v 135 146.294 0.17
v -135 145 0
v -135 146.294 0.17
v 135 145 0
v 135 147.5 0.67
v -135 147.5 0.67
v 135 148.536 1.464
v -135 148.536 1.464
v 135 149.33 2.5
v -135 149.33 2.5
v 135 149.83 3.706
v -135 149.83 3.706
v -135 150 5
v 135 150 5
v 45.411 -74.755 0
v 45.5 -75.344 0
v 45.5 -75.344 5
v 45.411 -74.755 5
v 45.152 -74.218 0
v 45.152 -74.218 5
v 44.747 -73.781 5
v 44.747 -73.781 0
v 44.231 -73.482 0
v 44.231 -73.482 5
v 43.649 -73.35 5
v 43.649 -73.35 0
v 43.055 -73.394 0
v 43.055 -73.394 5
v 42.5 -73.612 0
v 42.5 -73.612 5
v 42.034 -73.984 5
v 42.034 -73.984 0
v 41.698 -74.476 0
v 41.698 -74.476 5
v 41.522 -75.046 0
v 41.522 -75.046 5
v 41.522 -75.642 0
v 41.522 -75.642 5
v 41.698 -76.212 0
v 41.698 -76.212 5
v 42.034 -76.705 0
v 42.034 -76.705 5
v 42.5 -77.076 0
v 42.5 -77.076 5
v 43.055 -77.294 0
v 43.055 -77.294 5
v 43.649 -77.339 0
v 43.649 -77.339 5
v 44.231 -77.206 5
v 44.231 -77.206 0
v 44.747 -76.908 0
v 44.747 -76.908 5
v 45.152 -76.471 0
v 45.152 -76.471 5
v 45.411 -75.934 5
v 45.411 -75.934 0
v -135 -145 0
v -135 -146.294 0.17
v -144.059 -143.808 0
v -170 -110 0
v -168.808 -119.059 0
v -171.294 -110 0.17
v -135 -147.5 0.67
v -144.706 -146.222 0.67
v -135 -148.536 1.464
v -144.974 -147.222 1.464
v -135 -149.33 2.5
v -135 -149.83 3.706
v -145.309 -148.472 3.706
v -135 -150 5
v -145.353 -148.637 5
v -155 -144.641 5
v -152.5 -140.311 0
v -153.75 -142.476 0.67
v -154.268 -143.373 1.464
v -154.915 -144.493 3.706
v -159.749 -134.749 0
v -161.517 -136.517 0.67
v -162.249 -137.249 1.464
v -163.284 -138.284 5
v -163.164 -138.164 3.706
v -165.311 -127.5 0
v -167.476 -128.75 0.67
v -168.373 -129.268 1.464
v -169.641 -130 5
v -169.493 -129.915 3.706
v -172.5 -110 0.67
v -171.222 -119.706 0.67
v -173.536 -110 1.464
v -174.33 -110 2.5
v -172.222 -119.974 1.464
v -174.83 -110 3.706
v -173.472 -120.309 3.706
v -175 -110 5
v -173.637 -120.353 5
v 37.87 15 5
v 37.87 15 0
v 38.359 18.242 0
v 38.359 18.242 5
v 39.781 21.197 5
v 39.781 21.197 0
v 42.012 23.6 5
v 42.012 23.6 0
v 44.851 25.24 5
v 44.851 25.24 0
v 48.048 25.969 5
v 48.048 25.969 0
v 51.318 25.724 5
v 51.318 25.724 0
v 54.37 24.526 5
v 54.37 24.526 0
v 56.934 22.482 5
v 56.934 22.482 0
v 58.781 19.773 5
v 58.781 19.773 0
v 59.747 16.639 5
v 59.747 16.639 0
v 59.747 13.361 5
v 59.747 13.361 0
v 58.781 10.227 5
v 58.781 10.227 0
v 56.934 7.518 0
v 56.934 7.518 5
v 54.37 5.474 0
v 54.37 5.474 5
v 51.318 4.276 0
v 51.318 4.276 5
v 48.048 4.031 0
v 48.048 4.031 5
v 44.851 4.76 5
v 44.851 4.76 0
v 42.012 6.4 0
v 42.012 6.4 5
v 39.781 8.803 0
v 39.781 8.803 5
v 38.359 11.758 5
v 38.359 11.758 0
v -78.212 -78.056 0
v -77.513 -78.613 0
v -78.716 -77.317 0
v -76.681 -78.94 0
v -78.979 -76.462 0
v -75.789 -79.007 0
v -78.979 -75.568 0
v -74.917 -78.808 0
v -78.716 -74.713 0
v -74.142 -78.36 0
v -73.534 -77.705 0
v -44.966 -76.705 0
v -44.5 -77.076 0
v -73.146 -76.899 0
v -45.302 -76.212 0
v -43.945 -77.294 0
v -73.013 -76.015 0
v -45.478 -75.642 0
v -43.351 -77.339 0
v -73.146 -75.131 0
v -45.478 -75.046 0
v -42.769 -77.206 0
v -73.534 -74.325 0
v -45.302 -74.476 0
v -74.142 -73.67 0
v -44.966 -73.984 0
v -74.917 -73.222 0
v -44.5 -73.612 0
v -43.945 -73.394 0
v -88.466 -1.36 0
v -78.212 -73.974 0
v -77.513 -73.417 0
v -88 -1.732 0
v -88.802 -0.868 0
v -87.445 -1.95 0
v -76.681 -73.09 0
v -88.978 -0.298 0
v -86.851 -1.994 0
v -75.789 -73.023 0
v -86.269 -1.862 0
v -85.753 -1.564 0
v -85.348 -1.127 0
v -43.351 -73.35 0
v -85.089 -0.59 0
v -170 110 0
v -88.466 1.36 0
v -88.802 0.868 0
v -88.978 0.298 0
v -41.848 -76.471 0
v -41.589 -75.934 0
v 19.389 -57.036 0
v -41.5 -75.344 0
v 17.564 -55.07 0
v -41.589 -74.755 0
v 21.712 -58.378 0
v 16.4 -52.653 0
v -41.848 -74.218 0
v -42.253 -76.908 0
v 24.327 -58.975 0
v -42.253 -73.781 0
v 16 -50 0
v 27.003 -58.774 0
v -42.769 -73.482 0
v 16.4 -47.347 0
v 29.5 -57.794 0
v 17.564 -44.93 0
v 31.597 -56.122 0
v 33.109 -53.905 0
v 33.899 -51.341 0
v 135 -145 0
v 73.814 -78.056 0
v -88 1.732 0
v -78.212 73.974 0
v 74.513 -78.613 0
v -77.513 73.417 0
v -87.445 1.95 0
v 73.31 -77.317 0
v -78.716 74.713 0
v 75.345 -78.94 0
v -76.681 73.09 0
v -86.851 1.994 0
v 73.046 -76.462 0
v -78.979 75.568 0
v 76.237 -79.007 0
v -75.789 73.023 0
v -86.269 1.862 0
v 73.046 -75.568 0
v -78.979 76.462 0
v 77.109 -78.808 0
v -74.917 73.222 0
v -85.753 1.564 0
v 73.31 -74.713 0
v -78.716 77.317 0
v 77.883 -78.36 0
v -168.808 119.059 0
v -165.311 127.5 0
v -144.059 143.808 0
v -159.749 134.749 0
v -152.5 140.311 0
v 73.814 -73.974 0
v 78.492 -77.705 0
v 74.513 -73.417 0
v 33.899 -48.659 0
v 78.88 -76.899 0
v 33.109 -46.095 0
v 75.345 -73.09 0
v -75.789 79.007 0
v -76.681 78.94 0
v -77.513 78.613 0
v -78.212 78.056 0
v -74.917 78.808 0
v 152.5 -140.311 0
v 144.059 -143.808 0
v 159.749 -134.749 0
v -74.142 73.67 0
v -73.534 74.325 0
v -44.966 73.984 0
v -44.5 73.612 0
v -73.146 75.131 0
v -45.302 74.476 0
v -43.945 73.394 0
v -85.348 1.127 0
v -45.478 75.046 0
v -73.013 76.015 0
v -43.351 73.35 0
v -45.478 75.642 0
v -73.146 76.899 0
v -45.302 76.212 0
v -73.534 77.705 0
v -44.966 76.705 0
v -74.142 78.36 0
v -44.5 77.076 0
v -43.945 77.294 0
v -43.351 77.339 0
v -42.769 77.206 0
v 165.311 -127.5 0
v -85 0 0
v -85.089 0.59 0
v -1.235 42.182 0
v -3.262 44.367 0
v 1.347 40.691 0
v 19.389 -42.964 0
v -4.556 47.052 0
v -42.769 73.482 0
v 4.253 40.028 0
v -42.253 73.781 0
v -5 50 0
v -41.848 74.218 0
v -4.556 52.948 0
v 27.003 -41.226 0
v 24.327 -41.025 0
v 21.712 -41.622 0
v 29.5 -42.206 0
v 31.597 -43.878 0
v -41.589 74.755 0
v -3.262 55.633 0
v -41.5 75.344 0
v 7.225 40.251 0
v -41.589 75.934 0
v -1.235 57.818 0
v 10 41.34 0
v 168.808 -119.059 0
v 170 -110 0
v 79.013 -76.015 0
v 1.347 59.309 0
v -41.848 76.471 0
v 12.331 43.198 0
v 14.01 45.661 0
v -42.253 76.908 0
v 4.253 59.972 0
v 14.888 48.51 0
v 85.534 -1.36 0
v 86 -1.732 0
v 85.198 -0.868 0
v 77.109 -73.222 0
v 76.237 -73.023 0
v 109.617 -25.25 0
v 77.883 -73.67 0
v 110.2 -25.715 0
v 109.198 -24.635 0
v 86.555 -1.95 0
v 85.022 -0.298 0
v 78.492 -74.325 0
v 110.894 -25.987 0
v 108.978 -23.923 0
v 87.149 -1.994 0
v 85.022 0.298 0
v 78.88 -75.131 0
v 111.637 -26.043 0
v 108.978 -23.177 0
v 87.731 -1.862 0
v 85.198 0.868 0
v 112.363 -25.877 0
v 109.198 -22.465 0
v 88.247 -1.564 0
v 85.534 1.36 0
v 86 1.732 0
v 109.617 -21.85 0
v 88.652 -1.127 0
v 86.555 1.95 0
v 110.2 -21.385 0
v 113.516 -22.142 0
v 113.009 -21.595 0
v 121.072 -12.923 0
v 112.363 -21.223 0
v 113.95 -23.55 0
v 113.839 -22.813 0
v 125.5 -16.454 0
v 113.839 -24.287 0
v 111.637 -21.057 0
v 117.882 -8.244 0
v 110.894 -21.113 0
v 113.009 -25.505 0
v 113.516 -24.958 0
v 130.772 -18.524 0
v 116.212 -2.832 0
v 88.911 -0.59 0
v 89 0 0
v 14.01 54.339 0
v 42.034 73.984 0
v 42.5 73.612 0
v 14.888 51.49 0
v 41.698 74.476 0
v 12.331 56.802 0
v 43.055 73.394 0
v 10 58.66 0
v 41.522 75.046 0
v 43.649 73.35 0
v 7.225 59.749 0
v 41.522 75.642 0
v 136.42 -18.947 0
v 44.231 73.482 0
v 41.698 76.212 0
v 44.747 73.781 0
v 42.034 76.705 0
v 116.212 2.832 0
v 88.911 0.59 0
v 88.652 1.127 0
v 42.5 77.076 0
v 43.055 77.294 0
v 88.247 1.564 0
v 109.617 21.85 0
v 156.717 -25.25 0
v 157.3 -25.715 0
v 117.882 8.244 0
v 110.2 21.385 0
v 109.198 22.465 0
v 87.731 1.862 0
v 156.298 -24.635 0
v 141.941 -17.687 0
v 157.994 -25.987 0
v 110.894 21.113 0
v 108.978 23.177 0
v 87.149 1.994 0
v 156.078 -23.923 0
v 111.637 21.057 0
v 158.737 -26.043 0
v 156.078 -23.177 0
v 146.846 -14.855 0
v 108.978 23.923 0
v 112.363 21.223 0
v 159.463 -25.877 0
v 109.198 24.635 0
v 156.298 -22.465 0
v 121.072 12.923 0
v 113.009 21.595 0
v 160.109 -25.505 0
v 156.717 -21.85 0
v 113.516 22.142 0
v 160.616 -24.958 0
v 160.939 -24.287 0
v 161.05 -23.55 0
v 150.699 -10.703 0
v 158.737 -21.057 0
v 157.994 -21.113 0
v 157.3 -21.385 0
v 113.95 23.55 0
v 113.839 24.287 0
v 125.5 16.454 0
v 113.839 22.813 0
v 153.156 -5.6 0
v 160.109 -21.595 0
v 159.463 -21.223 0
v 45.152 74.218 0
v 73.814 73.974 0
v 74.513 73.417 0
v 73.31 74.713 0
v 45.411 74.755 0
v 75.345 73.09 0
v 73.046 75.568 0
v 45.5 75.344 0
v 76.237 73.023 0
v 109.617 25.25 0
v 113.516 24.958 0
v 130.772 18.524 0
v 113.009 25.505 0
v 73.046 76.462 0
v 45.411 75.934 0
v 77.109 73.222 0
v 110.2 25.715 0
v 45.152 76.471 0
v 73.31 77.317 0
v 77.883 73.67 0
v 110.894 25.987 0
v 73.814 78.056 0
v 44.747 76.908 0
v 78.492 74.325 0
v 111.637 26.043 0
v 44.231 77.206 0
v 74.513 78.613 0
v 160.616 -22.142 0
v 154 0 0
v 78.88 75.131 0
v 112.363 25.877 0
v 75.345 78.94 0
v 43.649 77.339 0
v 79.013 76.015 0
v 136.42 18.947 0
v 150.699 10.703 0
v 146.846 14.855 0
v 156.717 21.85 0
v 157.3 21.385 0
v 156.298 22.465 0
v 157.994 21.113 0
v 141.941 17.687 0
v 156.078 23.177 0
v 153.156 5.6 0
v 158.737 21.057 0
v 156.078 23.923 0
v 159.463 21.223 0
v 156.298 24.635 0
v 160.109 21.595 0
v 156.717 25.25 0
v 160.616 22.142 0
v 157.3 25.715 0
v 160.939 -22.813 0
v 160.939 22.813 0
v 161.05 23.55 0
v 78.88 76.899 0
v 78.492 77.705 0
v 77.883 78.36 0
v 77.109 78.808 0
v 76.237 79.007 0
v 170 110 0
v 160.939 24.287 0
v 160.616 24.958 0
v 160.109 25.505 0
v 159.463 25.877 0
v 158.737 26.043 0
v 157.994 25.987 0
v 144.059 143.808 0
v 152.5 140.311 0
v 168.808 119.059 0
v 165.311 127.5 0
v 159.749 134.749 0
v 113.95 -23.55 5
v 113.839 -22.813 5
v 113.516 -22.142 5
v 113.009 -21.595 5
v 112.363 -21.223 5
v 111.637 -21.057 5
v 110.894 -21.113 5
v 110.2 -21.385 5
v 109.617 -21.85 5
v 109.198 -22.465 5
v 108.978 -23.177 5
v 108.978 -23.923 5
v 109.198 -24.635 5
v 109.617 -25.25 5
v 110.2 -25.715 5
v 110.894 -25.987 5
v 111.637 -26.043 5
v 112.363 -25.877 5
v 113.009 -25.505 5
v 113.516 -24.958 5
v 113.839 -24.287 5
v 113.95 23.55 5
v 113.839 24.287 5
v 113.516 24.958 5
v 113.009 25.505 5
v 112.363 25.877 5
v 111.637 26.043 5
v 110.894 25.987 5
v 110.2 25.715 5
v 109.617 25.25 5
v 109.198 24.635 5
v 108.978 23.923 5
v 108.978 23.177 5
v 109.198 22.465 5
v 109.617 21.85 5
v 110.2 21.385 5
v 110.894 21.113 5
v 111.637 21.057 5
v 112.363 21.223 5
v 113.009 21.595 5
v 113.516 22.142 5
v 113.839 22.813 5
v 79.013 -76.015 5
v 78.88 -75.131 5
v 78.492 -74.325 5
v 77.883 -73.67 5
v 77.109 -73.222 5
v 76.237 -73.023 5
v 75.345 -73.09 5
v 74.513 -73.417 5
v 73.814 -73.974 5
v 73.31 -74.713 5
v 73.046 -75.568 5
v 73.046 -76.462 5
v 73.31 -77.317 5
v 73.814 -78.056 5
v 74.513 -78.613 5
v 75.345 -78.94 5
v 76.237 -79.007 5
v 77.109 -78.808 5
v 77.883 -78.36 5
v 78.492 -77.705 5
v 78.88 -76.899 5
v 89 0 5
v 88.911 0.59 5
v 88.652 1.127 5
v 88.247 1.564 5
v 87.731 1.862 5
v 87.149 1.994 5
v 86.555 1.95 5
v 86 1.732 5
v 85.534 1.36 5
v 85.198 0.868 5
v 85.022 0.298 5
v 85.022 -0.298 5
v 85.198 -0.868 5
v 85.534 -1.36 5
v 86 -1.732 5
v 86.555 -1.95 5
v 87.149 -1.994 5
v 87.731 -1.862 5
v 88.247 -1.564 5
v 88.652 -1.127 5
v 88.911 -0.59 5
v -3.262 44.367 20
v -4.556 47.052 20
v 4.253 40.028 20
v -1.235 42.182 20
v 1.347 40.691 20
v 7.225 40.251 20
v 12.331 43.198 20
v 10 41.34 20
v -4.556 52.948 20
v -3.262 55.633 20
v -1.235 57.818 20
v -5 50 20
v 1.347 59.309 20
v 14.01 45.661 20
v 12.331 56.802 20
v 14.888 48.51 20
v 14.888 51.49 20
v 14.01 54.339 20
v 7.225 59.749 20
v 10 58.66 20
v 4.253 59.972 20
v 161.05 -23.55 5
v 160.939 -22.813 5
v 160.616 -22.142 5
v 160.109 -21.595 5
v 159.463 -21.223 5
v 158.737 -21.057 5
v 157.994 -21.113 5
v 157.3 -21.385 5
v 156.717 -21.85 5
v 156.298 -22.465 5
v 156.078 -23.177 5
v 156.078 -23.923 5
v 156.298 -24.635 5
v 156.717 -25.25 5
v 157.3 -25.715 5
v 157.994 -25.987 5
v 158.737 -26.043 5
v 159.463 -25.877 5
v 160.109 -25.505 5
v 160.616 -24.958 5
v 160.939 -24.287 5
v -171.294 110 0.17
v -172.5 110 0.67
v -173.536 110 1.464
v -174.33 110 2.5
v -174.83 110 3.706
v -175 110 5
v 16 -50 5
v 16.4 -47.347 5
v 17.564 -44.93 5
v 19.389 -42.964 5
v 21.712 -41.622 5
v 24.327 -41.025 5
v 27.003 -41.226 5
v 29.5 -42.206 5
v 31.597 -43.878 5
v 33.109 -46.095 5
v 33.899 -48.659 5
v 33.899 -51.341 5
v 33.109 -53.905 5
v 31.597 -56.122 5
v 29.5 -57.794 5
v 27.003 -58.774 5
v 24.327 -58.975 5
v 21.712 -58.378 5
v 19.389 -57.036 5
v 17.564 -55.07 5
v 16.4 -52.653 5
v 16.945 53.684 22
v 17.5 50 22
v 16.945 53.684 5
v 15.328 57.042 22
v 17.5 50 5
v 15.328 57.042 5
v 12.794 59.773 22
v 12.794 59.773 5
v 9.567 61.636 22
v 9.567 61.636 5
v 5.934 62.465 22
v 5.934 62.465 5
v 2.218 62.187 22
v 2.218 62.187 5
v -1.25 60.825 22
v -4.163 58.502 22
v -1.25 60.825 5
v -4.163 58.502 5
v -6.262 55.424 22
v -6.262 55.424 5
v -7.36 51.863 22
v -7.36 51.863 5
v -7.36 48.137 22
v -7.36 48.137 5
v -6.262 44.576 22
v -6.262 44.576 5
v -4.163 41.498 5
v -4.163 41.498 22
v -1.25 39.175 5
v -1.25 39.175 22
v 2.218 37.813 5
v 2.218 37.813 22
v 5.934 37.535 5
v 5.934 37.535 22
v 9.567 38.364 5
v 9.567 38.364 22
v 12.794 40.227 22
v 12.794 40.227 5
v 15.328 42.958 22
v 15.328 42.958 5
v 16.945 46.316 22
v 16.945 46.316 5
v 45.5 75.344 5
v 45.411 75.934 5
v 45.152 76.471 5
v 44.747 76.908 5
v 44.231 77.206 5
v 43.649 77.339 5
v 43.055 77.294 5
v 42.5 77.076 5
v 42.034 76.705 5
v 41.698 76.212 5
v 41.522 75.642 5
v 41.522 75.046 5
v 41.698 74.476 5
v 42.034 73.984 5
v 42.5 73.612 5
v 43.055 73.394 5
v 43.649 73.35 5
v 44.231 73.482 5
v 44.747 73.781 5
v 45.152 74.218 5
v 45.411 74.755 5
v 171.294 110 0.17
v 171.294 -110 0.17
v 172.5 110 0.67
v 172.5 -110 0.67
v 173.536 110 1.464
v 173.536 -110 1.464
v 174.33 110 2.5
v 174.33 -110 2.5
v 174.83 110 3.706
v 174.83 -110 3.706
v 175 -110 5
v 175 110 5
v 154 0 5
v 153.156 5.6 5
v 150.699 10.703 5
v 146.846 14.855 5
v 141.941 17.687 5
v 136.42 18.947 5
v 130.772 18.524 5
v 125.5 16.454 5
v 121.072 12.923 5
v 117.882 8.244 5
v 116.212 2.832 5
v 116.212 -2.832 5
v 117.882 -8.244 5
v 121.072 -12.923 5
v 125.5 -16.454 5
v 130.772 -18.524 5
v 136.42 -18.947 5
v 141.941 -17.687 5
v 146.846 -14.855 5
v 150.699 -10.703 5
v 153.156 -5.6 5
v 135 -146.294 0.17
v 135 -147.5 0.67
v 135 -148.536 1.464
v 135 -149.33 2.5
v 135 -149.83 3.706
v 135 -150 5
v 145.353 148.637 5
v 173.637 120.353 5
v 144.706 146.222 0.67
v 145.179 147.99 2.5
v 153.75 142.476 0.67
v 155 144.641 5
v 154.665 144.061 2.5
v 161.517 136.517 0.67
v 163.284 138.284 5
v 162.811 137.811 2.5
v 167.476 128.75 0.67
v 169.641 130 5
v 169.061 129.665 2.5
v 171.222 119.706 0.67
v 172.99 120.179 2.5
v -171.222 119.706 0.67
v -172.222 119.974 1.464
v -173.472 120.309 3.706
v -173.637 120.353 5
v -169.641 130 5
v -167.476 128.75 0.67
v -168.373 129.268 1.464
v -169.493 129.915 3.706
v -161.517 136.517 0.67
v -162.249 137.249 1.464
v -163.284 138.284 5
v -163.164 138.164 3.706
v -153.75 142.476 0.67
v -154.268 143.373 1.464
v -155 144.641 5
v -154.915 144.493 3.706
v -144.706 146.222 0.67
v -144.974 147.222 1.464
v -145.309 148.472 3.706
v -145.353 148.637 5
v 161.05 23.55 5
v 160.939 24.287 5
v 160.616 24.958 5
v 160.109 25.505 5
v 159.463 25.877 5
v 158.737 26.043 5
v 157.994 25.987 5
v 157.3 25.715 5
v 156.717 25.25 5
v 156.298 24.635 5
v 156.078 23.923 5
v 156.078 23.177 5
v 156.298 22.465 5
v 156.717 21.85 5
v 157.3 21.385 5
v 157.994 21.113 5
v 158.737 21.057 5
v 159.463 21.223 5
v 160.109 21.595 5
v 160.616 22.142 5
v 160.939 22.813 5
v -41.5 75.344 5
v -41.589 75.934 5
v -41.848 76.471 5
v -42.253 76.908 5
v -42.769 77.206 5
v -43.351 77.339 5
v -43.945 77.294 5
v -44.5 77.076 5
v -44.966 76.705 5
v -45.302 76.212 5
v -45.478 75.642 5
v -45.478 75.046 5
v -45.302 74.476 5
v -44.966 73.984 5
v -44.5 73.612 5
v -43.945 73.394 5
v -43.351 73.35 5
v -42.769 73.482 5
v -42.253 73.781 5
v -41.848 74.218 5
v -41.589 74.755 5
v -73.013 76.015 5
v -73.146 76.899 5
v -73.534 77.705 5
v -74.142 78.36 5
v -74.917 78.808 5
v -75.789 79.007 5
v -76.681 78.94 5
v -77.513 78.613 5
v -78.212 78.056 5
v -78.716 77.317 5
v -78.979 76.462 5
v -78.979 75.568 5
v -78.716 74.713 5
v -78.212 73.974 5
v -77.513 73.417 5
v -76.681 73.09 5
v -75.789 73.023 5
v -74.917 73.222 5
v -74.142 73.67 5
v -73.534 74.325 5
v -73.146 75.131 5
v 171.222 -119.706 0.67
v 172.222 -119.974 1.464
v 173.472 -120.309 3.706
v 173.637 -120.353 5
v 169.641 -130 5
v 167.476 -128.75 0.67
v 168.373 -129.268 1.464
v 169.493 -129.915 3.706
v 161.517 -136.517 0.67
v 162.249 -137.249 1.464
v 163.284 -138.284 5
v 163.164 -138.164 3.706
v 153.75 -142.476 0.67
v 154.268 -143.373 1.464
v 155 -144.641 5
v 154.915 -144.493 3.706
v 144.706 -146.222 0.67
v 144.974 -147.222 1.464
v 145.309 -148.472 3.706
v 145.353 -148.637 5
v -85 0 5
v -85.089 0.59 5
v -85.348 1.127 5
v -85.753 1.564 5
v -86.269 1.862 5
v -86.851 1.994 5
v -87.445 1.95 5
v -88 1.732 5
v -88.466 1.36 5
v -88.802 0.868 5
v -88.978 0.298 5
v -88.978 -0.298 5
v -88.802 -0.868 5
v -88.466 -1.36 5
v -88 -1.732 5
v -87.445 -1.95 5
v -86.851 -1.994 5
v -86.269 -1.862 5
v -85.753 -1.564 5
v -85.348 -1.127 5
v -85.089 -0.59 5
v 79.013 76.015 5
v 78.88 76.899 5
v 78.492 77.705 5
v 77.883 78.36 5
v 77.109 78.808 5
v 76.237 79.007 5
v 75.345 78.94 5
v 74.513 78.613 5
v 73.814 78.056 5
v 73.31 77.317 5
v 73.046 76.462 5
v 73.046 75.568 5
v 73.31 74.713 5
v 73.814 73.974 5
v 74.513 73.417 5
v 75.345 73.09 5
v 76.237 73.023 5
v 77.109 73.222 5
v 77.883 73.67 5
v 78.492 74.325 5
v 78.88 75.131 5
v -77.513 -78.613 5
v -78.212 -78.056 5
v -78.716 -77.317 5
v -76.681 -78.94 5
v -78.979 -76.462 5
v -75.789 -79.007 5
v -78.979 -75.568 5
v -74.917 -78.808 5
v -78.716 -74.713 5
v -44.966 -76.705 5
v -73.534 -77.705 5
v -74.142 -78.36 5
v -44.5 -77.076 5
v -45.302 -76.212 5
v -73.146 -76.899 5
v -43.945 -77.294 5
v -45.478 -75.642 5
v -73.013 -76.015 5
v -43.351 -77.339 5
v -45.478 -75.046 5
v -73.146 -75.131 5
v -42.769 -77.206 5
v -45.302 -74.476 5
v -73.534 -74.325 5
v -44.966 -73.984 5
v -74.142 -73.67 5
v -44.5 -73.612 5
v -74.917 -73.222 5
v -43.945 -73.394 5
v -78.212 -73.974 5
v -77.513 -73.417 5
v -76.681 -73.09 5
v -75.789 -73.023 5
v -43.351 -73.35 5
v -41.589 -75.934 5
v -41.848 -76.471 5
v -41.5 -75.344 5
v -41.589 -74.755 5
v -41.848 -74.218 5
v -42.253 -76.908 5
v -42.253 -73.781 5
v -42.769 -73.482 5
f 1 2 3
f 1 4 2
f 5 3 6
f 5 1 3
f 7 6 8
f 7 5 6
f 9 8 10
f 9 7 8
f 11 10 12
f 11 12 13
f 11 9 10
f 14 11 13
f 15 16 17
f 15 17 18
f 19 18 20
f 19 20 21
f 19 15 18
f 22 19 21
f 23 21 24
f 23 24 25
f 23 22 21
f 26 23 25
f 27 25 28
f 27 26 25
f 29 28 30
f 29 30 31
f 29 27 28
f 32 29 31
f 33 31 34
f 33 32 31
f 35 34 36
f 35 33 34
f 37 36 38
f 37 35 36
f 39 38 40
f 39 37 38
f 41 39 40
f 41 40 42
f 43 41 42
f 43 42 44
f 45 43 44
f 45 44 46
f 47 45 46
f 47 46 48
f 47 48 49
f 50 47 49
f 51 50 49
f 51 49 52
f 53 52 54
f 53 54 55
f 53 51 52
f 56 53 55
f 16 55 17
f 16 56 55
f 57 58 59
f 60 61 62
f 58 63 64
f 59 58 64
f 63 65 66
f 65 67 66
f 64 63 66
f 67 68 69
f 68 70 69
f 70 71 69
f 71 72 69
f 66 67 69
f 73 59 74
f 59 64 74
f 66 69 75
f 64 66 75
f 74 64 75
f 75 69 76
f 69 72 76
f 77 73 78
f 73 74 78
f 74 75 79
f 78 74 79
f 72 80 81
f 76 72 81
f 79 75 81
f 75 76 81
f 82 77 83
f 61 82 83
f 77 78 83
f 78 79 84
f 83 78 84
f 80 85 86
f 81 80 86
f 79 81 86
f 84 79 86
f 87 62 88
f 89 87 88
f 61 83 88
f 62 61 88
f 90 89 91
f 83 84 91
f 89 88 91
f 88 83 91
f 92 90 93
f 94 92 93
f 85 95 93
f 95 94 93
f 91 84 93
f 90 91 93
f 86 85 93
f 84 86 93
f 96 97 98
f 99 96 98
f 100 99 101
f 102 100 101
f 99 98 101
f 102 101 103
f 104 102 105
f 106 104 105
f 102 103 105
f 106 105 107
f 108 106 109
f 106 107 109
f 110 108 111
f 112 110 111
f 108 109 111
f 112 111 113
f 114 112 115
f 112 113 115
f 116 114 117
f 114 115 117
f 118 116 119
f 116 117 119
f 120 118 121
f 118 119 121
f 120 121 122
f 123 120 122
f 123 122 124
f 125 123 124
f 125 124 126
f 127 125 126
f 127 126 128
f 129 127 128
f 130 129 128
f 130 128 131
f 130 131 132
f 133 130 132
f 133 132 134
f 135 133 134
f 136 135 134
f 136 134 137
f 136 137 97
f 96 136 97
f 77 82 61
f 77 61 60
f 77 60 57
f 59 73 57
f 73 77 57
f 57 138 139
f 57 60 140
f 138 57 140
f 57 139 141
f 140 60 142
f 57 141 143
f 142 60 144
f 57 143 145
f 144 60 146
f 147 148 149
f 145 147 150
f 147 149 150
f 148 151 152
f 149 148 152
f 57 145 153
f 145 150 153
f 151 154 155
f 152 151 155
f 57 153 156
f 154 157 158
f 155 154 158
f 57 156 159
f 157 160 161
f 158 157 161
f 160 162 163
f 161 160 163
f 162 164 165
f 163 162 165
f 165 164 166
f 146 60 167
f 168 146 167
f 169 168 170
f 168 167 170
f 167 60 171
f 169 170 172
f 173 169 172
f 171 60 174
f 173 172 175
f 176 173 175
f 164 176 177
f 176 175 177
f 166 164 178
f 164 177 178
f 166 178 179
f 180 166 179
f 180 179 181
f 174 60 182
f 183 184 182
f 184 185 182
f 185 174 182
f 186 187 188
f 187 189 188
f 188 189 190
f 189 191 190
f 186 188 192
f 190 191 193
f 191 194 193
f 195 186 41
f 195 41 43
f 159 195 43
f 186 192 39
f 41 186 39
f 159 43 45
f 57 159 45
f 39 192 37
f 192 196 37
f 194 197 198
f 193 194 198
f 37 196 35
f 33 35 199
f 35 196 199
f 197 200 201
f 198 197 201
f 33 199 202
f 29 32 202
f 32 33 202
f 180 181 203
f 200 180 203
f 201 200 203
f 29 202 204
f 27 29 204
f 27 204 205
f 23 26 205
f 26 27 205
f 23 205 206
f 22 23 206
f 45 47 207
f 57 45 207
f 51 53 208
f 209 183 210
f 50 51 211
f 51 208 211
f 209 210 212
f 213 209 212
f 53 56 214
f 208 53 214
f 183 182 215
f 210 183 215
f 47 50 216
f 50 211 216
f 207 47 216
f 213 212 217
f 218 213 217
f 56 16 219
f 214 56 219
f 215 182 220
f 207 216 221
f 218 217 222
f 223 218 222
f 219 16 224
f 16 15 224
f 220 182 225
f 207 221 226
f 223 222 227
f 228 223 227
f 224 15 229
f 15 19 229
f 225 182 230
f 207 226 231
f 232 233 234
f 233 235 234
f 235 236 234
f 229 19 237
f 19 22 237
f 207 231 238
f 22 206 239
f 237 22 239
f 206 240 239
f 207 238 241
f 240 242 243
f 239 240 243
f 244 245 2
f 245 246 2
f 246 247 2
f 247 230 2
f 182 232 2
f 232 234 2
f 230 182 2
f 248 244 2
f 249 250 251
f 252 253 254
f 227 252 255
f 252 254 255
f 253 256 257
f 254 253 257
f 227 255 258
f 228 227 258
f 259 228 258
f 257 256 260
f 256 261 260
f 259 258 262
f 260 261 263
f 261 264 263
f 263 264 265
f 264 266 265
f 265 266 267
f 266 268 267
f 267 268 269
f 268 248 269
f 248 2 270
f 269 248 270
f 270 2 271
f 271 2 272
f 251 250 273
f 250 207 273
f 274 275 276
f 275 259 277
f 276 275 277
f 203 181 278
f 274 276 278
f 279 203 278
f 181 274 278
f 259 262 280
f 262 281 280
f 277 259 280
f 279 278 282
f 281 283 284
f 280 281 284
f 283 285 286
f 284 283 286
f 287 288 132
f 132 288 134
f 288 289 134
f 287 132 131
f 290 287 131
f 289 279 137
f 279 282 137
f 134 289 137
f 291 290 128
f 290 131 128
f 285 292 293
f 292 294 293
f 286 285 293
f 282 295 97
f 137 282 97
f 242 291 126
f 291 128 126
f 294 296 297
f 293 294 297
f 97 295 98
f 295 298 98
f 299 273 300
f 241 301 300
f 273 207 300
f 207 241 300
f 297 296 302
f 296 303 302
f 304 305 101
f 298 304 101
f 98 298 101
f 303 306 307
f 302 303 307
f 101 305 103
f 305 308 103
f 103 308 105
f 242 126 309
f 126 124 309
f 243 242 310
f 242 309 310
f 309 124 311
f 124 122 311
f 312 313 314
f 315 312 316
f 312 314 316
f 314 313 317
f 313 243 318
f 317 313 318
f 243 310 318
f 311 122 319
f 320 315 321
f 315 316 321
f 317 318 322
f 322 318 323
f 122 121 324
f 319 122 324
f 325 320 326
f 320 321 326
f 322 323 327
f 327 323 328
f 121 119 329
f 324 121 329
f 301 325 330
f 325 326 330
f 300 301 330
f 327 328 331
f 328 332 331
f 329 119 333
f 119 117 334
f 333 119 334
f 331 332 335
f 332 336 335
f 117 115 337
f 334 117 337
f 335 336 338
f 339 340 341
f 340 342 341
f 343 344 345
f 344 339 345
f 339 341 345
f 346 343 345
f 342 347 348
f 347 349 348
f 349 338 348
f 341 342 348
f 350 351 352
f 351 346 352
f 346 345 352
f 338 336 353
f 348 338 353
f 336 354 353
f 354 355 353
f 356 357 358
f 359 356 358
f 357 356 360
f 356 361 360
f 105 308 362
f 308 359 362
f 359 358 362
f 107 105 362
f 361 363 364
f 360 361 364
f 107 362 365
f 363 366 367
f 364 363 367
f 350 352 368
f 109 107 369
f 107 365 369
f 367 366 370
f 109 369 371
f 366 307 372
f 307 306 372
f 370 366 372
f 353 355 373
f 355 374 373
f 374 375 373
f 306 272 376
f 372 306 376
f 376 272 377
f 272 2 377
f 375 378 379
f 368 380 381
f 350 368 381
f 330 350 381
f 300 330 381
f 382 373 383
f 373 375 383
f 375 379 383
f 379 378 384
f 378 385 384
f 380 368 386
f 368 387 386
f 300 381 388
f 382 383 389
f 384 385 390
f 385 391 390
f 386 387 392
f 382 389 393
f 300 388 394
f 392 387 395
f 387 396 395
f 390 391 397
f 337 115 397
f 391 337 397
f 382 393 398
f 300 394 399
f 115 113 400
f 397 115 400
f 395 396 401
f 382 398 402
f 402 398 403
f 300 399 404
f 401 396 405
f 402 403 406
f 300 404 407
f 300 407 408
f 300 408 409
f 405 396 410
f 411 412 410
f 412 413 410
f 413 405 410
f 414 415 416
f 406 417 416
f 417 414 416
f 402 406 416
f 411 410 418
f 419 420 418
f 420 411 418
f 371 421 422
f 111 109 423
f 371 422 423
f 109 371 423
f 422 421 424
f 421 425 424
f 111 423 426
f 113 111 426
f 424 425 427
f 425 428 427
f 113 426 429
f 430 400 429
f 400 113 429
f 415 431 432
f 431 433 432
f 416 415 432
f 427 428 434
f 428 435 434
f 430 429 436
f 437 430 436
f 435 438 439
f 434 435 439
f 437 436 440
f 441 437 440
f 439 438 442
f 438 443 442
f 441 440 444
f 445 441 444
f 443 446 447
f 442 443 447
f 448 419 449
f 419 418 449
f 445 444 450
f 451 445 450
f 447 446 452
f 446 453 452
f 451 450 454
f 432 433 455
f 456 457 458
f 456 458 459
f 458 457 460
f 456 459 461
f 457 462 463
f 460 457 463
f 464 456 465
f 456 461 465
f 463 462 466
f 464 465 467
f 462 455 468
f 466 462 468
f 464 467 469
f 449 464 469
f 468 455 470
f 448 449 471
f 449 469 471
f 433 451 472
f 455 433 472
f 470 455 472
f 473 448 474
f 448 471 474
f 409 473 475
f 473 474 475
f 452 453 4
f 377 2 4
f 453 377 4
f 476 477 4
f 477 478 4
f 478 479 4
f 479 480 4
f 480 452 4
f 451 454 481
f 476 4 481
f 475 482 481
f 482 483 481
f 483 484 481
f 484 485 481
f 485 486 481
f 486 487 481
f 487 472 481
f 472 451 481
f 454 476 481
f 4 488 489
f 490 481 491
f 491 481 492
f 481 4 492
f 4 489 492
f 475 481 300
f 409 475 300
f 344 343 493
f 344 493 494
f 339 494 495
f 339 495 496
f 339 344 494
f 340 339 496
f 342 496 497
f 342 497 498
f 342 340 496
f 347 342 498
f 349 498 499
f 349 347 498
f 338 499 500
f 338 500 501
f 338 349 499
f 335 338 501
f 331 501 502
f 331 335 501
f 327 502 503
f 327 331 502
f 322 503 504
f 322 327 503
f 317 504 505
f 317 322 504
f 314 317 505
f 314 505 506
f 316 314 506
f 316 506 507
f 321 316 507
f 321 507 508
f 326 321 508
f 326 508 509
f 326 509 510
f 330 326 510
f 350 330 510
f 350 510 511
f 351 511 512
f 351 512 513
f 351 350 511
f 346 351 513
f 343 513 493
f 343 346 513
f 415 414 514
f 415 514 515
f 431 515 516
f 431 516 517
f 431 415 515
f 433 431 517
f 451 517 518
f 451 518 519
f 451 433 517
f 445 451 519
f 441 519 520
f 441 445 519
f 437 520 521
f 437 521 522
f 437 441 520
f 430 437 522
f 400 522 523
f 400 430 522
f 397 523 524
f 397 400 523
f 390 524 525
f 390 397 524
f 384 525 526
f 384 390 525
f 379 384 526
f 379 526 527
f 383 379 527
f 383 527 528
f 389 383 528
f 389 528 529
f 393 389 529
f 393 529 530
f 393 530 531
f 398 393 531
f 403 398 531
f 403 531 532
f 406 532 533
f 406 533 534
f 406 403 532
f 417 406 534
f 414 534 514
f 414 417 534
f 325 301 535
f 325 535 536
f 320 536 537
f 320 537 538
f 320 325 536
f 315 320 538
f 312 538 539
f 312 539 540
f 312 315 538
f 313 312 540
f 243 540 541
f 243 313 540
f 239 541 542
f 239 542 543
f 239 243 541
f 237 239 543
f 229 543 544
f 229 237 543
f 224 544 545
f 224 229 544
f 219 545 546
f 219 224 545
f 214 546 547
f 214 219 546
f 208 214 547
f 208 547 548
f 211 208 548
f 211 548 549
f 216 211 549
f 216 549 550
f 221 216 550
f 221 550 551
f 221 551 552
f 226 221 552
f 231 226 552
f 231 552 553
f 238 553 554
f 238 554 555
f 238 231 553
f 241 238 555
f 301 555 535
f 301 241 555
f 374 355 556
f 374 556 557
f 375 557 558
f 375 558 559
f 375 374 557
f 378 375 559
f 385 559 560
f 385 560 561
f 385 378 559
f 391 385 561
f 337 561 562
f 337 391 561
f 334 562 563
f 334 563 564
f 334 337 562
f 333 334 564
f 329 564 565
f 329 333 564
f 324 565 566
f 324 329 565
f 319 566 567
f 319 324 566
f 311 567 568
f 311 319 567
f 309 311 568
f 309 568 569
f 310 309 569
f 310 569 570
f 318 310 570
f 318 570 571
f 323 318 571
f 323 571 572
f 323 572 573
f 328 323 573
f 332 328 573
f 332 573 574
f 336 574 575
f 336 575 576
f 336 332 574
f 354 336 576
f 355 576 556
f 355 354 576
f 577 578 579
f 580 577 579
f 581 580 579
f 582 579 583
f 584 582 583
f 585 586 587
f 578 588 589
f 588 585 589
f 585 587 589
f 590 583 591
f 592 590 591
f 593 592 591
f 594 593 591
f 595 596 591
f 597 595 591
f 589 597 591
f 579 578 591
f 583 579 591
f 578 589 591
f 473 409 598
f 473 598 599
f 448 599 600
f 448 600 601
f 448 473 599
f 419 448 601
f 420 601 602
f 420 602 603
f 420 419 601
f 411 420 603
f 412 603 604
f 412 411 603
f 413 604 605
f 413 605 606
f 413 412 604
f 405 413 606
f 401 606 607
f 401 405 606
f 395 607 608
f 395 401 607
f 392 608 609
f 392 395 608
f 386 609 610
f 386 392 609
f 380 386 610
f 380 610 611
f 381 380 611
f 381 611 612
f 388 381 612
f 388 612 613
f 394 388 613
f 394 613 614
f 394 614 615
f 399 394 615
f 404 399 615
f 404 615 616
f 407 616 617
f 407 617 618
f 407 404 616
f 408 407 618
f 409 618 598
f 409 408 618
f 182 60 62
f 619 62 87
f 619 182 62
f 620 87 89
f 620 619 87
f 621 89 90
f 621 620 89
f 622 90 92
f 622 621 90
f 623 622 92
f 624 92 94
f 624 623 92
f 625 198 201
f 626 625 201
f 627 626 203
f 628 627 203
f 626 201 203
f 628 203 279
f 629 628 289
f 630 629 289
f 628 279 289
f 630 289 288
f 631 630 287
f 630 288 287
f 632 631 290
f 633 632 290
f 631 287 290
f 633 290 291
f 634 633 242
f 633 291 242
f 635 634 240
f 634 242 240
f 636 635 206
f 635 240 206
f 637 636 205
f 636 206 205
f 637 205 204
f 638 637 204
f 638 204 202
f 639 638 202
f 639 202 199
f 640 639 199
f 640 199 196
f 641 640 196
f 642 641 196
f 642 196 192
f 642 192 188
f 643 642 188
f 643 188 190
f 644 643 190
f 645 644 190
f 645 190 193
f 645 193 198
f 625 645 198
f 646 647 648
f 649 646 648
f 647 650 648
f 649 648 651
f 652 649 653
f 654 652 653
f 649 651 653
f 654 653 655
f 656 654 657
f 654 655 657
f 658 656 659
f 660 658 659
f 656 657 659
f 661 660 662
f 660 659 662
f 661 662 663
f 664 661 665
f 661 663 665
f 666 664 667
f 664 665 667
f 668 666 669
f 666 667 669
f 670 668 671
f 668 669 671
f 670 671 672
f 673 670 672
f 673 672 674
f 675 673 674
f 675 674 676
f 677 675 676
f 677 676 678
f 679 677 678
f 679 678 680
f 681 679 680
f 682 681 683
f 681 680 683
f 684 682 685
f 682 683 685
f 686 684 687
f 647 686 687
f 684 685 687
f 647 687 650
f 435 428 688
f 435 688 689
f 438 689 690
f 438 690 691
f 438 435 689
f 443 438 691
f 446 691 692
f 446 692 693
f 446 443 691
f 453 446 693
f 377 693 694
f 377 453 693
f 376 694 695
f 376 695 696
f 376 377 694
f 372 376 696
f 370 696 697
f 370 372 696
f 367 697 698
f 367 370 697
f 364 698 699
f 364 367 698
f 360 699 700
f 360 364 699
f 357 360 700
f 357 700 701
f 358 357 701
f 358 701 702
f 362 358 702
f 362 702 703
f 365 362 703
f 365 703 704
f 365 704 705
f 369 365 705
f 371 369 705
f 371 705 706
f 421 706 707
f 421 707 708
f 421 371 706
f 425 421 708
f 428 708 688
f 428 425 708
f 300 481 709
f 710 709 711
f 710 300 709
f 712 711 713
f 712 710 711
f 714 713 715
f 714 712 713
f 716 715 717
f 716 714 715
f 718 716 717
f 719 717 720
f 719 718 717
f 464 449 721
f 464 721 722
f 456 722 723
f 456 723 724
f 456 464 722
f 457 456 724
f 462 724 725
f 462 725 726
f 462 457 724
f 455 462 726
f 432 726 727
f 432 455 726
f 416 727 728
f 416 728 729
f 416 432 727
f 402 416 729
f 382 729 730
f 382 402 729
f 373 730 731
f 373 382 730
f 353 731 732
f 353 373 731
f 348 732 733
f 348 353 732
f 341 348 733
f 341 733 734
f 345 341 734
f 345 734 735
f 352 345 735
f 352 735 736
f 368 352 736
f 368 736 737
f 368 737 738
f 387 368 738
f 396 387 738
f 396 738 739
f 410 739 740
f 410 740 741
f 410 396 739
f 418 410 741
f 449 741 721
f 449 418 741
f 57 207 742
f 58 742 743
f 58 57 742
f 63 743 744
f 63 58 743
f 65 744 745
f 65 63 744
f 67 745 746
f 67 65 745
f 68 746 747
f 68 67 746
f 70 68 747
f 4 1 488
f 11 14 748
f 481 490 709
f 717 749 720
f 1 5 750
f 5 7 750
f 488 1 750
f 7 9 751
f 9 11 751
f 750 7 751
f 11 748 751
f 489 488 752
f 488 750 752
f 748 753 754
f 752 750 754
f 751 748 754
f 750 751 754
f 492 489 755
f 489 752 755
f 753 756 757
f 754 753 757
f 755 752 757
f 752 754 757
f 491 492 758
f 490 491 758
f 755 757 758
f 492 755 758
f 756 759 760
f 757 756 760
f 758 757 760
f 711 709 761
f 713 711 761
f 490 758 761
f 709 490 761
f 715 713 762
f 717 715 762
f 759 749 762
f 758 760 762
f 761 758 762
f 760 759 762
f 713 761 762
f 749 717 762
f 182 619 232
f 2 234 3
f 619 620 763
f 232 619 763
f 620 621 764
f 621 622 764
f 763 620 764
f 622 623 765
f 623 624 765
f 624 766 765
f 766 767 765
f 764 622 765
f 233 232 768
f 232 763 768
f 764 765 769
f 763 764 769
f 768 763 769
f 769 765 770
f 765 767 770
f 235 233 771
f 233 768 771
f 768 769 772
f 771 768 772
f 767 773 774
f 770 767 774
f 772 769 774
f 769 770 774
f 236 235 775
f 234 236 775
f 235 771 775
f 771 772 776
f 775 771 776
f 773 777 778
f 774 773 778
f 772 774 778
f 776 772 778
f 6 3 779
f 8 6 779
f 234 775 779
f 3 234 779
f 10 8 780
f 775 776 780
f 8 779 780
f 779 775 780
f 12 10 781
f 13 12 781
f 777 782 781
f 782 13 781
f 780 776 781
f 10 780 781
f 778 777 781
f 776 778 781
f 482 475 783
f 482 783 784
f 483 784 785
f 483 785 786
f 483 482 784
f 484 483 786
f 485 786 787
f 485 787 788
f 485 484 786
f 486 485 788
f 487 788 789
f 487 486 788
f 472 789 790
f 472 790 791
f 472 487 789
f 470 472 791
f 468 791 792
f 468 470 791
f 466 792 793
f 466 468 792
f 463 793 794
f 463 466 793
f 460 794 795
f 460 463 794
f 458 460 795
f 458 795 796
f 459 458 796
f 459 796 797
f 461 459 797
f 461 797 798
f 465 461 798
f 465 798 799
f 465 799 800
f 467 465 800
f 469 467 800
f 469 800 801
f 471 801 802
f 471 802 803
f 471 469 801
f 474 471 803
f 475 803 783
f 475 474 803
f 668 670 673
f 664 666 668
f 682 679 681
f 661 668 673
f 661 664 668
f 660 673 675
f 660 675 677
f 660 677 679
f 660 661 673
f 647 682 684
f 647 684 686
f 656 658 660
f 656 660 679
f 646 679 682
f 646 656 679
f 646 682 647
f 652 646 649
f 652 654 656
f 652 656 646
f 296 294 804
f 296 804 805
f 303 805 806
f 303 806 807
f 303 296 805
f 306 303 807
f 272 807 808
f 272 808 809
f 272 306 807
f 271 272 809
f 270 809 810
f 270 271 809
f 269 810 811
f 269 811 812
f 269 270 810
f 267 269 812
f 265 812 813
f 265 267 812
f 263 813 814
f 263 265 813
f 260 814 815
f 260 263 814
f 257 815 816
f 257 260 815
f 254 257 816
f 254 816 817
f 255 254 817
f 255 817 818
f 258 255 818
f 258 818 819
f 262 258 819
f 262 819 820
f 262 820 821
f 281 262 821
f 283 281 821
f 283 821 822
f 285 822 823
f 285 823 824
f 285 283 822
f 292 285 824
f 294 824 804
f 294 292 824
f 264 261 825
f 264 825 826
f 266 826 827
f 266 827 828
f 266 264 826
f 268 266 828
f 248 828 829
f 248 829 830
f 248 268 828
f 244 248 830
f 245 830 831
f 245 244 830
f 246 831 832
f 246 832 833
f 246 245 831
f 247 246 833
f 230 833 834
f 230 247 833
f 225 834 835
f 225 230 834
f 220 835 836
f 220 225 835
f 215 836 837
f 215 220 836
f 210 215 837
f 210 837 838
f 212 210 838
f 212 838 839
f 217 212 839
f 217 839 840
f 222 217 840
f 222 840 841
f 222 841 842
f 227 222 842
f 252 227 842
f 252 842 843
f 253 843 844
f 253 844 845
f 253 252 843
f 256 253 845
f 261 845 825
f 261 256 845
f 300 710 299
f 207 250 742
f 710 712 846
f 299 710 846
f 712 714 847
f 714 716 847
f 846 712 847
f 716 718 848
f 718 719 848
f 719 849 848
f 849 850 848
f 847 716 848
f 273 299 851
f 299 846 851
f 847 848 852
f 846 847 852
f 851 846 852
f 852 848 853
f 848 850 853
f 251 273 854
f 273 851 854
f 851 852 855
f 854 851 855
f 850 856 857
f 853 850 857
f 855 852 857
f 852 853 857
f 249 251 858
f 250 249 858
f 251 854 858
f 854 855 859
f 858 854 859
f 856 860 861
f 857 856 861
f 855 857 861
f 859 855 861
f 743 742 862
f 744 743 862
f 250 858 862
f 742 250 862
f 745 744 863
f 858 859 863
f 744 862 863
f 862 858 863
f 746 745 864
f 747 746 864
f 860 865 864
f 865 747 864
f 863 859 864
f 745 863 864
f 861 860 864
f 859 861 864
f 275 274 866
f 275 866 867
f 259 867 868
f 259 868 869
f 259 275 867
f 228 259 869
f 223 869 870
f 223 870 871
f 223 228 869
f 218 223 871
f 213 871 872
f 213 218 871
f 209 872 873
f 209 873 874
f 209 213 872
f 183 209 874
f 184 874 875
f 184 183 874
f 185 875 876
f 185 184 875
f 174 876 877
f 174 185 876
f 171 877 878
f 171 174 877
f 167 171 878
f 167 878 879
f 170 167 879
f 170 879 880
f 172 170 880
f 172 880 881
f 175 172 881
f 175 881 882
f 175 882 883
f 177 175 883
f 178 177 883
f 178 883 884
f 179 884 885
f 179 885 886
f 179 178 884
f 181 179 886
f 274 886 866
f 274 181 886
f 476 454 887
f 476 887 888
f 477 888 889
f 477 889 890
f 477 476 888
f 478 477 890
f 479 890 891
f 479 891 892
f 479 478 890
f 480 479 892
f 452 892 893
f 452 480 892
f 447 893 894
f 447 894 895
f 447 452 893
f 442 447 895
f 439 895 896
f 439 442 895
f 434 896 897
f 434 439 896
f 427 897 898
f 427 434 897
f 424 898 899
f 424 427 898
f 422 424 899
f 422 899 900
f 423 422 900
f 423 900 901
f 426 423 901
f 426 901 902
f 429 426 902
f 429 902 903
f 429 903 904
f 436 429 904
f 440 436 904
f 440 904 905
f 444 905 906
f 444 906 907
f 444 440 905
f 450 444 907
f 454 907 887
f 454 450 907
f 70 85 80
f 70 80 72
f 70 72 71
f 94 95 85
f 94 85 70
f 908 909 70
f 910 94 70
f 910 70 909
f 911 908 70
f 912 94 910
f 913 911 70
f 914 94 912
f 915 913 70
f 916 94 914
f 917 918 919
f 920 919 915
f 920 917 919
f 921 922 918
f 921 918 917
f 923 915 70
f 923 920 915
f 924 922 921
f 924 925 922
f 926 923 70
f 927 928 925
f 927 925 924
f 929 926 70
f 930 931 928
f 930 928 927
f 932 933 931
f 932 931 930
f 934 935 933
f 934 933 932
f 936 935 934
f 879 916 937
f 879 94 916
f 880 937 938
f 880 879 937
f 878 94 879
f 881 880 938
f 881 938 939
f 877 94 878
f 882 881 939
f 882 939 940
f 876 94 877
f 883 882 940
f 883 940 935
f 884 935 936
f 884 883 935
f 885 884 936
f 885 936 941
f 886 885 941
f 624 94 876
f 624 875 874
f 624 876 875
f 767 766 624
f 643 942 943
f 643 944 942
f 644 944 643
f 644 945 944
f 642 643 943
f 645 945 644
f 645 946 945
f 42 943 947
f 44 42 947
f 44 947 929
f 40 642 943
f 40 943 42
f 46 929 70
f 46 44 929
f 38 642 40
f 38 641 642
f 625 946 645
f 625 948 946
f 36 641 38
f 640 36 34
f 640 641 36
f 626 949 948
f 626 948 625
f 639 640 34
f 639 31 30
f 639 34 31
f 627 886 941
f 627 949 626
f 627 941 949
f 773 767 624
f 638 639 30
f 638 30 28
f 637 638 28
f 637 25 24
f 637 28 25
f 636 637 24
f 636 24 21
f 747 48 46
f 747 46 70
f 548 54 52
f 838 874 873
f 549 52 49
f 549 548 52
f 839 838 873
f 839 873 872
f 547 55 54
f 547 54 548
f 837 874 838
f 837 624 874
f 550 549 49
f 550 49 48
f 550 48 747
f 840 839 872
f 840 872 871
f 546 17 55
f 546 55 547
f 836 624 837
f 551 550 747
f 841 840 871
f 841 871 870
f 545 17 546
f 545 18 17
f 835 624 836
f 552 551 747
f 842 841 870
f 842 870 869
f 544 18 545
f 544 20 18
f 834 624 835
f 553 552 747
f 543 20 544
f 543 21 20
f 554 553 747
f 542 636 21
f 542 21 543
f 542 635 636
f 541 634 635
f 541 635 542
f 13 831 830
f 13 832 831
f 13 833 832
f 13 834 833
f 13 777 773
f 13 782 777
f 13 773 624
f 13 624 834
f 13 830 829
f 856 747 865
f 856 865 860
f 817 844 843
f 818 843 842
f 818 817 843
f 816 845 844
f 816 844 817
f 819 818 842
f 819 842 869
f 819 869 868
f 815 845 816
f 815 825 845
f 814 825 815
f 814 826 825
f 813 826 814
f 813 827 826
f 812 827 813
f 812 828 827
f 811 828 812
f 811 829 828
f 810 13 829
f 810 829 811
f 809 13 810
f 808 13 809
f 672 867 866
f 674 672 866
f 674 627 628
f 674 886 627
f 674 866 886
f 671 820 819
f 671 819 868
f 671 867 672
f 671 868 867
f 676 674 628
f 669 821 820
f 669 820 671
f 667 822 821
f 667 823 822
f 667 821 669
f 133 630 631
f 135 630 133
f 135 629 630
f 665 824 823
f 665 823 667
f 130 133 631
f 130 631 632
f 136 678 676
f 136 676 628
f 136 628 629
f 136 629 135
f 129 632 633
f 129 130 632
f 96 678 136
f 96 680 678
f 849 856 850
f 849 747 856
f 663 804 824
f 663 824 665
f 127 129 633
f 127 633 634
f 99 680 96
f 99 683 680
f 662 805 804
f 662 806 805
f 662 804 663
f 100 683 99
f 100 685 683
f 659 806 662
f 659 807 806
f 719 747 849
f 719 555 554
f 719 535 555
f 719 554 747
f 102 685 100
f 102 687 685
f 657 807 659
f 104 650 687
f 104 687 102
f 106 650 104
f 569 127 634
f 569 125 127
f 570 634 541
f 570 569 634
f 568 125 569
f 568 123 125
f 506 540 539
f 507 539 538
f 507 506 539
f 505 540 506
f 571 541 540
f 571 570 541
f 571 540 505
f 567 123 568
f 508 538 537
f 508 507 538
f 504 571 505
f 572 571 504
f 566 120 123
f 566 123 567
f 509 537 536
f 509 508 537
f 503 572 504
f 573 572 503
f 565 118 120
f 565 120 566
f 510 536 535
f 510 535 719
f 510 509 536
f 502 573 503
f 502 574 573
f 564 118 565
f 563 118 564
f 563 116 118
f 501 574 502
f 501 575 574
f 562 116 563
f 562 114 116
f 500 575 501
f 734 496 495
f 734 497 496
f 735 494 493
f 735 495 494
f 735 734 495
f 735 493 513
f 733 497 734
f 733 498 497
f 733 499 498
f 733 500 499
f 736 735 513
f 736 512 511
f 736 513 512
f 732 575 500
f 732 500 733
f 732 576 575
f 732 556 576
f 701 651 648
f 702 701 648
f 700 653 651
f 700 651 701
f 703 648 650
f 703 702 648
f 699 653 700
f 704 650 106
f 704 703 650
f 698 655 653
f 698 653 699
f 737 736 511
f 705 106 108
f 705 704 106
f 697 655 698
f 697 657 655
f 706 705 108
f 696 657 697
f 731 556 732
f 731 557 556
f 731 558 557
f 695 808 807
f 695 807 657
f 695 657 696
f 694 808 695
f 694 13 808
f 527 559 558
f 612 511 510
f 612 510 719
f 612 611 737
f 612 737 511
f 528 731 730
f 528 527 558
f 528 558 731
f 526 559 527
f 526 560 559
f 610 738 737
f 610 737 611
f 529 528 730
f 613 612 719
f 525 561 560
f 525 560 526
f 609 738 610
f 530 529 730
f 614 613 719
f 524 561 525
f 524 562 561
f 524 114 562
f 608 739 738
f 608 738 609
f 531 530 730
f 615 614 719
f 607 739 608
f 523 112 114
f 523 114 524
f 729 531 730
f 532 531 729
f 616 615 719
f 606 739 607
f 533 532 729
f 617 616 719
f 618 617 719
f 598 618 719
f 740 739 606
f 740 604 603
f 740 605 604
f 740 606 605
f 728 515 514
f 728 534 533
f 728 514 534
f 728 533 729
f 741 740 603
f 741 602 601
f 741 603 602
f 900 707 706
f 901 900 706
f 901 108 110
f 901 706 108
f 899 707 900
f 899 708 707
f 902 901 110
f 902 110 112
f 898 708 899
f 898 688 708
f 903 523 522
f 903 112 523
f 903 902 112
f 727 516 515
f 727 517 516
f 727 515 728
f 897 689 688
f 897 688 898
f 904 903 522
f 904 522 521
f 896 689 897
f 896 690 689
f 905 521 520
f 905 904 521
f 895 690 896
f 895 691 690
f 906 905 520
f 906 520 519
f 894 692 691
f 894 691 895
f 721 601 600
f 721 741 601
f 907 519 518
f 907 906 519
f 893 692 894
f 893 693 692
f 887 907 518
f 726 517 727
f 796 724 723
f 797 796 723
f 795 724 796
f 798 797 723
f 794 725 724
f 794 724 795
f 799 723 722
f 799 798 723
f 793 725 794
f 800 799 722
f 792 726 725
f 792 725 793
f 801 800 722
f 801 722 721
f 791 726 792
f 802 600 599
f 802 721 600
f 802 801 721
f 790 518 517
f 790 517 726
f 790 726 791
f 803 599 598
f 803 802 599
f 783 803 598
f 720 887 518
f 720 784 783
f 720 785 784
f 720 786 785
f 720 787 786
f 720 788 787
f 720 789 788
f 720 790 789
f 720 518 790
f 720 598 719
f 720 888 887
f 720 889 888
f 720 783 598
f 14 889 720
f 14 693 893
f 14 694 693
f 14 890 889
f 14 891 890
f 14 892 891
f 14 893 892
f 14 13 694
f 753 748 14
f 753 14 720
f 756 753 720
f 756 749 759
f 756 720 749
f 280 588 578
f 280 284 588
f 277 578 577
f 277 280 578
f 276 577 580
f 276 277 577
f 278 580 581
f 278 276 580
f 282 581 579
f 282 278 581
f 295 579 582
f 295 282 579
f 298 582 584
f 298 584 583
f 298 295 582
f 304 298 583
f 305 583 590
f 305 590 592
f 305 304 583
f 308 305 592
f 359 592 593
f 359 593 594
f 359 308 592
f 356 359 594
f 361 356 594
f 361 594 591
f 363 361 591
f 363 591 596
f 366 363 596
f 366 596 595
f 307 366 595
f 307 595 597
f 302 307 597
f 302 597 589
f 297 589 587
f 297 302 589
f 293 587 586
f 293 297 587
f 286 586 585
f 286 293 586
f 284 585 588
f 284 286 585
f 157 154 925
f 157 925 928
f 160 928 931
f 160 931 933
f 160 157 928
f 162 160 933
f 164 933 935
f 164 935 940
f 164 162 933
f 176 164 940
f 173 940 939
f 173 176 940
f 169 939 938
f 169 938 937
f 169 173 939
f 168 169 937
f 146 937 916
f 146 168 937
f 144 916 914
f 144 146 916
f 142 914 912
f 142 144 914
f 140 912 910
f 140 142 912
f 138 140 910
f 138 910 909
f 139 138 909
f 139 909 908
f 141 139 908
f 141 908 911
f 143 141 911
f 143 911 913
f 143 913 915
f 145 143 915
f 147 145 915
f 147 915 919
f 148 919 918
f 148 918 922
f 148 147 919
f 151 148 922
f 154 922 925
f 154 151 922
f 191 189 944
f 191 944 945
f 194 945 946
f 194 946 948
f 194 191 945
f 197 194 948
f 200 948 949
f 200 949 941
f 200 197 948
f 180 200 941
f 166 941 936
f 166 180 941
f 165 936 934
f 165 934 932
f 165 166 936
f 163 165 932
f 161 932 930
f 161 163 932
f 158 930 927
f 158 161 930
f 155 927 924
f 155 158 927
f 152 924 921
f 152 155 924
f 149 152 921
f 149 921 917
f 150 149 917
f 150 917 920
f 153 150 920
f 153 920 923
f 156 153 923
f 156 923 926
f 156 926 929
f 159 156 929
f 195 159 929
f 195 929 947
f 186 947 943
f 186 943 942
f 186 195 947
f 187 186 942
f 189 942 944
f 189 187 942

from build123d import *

# Parameters (mm, degrees)
SKETCH1_W           = 350
SKETCH1_H           = 300
SKETCH1_R           = 2
SKETCH1_R_2         = 3
SKETCH1_R_3         = 19
SKETCH1_R_4         = 2.5
BOSS_EXTRUDE1_DEPTH = 5
CUT_EXTRUDE1_REACH  = 232.543
SKETCH2_R           = 11
SKETCH2_R_2         = 9
SKETCH2_R_3         = 10
FILLET1_R           = 40
FILLET2_R           = 5
SKETCH3_R           = 12.5
SKETCH3_R_2         = 10
BOSS_EXTRUDE2_DEPTH = 15
SKETCH4_R           = 12.5
BOSS_EXTRUDE3_DEPTH = 2


with BuildPart() as part:
    # Sketch1 → Boss-Extrude1 (new body)
    with BuildSketch(Plane.XY):
        Rectangle(SKETCH1_W, SKETCH1_H)
        with Locations((-43.5, 75.344210129)):
            Circle(SKETCH1_R, mode=Mode.SUBTRACT)
        with Locations((43.5, 75.344210129)):
            Circle(SKETCH1_R, mode=Mode.SUBTRACT)
        with Locations((87, 0)):
            Circle(SKETCH1_R, mode=Mode.SUBTRACT)
        with Locations((43.5, -75.344210129)):
            Circle(SKETCH1_R, mode=Mode.SUBTRACT)
        with Locations((-43.5, -75.344210129)):
            Circle(SKETCH1_R, mode=Mode.SUBTRACT)
        with Locations((-87, 0)):
            Circle(SKETCH1_R, mode=Mode.SUBTRACT)
        with Locations((-76.012957941, -76.015)):
            Circle(SKETCH1_R_2, mode=Mode.SUBTRACT)
        with Locations((76.012957941, 76.015)):
            Circle(SKETCH1_R_2, mode=Mode.SUBTRACT)
        with Locations((76.012957941, -76.015)):
            Circle(SKETCH1_R_2, mode=Mode.SUBTRACT)
        with Locations((-76.012957941, 76.015)):
            Circle(SKETCH1_R_2, mode=Mode.SUBTRACT)
        with Locations((135, 0)):
            Circle(SKETCH1_R_3, mode=Mode.SUBTRACT)
        with Locations((158.55, -23.55)):
            Circle(SKETCH1_R_4, mode=Mode.SUBTRACT)
        with Locations((111.45, -23.55)):
            Circle(SKETCH1_R_4, mode=Mode.SUBTRACT)
        with Locations((111.45, 23.55)):
            Circle(SKETCH1_R_4, mode=Mode.SUBTRACT)
        with Locations((158.55, 23.55)):
            Circle(SKETCH1_R_4, mode=Mode.SUBTRACT)
    extrude(amount=BOSS_EXTRUDE1_DEPTH)

    # Sketch2 → Cut-Extrude1 (cut, up to next)
    with BuildSketch(Plane(origin=(0, 0, 0), x_dir=(-1, 0, 0), z_dir=(0, 0, -1)), mode=Mode.PRIVATE) as cut_extrude1_sk1:
        with Locations((-48.87, 15)):
            Circle(SKETCH2_R)
    cut_extrude1_tool1 = extrude(cut_extrude1_sk1.sketch, amount=-CUT_EXTRUDE1_REACH, mode=Mode.PRIVATE) & part.part
    # Sketch2 → Cut-Extrude1 (cut, up to next)
    with BuildSketch(Plane(origin=(0, 0, 0), x_dir=(-1, 0, 0), z_dir=(0, 0, -1)), mode=Mode.PRIVATE) as cut_extrude1_sk2:
        with Locations((-25, -50)):
            Circle(SKETCH2_R_2)
    cut_extrude1_tool2 = extrude(cut_extrude1_sk2.sketch, amount=-CUT_EXTRUDE1_REACH, mode=Mode.PRIVATE) & part.part
    # Sketch2 → Cut-Extrude1 (cut, up to next)
    with BuildSketch(Plane(origin=(0, 0, 0), x_dir=(-1, 0, 0), z_dir=(0, 0, -1)), mode=Mode.PRIVATE) as cut_extrude1_sk3:
        with Locations((-5, 50)):
            Circle(SKETCH2_R_3)
    cut_extrude1_tool3 = extrude(cut_extrude1_sk3.sketch, amount=-CUT_EXTRUDE1_REACH, mode=Mode.PRIVATE) & part.part
    add(cut_extrude1_tool1.solids().sort_by_distance((48.87, 15, 0))[0], mode=Mode.SUBTRACT)
    add(cut_extrude1_tool2.solids().sort_by_distance((25, -50, 0))[0], mode=Mode.SUBTRACT)
    add(cut_extrude1_tool3.solids().sort_by_distance((5, 50, 0))[0], mode=Mode.SUBTRACT)

    # Fillet1
    fillet1_edges = [part.edges().sort_by_distance(p)[0] for p in [
        (175, -150, 2.5),
        (-175, -150, 2.5),
        (-175, 150, 2.5),
        (175, 150, 2.5),
    ]]
    fillet(fillet1_edges, radius=FILLET1_R)

    # Fillet2
    fillet2_edges = [part.edges().sort_by_distance(p)[0] for p in [
        (163.284271247, 138.284271247, 0),
        (175, 0, 0),
        (163.284271247, -138.284271247, 0),
        (0, -150, 0),
        (-163.284271247, -138.284271247, 0),
        (-175, 0, 0),
        (-163.284271247, 138.284271247, 0),
        (0, 150, 0),
    ]]
    fillet(fillet2_edges, radius=FILLET2_R - 0.0001)  # a hair under: the kernel refuses the full size

    # Sketch3 → Boss-Extrude2 (add)
    with BuildSketch(Plane.XY.offset(5)):
        with Locations((5, 50)):
            Circle(SKETCH3_R)
        with Locations(Location((5, 50, 0), (0, 0, 180))):
            Circle(SKETCH3_R_2, mode=Mode.SUBTRACT)
    extrude(amount=BOSS_EXTRUDE2_DEPTH)

    # Sketch4 → Boss-Extrude3 (add)
    with BuildSketch(Plane.XY.offset(20)):
        with Locations((5, 50)):
            Circle(SKETCH4_R)
    extrude(amount=BOSS_EXTRUDE3_DEPTH)


solid = part.part
